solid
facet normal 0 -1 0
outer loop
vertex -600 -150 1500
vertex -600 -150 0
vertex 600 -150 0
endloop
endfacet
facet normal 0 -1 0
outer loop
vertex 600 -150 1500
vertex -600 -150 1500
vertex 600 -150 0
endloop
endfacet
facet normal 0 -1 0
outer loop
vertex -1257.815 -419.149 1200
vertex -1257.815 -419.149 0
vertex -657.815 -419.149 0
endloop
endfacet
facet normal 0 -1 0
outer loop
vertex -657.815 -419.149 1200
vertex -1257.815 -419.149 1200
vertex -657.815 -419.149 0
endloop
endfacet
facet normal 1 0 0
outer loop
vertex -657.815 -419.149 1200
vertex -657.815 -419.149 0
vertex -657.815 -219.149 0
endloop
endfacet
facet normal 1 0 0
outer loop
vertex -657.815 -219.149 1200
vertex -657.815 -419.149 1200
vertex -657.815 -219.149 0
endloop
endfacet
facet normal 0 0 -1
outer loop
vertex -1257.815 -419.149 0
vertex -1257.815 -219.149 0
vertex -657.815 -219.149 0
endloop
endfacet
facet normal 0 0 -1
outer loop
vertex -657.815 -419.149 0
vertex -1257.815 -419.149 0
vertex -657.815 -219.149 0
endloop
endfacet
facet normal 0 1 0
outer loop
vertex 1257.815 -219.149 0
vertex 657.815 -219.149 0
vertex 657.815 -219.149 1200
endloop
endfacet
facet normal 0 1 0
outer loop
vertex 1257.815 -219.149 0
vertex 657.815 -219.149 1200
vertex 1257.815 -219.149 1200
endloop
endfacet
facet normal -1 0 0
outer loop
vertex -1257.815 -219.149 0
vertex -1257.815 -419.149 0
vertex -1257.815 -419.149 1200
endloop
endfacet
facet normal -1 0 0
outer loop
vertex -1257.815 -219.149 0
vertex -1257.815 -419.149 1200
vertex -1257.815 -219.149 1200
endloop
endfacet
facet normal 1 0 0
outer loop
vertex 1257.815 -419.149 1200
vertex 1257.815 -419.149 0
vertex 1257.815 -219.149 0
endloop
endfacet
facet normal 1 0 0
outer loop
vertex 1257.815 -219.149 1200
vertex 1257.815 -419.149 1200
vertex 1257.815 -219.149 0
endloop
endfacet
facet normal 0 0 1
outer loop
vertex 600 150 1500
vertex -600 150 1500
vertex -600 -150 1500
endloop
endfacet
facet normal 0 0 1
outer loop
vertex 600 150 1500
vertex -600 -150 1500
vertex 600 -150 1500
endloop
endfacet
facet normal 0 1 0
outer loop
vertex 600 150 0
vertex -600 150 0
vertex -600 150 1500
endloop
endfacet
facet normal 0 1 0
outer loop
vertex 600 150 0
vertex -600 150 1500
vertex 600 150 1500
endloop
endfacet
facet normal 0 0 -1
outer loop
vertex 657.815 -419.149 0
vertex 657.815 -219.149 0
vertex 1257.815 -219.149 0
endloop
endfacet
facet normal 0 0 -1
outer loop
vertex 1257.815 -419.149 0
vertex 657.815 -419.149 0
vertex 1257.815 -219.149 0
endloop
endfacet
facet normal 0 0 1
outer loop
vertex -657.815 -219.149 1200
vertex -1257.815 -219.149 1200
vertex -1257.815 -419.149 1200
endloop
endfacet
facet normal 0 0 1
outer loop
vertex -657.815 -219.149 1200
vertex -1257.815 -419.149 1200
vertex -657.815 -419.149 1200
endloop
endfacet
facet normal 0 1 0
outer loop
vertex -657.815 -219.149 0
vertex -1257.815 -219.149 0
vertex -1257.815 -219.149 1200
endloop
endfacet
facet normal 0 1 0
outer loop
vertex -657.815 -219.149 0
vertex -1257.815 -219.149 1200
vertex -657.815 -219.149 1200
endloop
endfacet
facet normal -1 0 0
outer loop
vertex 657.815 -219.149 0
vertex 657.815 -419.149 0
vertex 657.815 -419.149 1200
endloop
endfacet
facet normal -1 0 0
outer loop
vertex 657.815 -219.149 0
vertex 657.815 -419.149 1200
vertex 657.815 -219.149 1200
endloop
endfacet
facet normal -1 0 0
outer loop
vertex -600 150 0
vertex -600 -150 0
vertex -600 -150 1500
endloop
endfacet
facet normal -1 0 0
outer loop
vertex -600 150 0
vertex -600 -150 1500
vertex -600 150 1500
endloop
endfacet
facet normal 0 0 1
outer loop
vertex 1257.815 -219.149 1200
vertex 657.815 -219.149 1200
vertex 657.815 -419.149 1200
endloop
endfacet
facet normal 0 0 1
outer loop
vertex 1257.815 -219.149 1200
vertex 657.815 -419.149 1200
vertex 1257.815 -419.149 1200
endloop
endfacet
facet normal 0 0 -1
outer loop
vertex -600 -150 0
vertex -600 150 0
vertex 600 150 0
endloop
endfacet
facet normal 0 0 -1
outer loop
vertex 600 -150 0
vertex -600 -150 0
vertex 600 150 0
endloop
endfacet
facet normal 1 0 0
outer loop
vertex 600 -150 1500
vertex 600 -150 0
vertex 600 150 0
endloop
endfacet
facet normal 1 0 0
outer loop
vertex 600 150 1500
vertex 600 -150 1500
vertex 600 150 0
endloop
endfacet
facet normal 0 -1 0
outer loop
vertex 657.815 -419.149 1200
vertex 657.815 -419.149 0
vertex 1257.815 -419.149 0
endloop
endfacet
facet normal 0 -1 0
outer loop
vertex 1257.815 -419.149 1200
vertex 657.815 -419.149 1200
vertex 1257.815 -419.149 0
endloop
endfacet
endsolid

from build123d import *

# Parameters (mm, degrees)
F0_W     = 1200
F0_H     = 300
F1_DEPTH = 1500
F2_W     = 600
F2_H     = 200
F3_DEPTH = 1200


with BuildPart() as f1:
    # F0 (on Top) → F1 (new body)
    with BuildSketch(Plane.XY):
        Rectangle(F0_W, F0_H)
    extrude(amount=F1_DEPTH)


with BuildPart() as f3:
    # F2 (on Top) → F3 (new body)
    with BuildSketch(Plane.XY):
        with Locations((-957.815278, -319.148949)):
            Rectangle(F2_W, F2_H)
        with Locations((957.815278, -319.148949)):
            Rectangle(F2_W, F2_H)
    extrude(amount=F3_DEPTH)


solid = Compound([f1.part, f3.part])
